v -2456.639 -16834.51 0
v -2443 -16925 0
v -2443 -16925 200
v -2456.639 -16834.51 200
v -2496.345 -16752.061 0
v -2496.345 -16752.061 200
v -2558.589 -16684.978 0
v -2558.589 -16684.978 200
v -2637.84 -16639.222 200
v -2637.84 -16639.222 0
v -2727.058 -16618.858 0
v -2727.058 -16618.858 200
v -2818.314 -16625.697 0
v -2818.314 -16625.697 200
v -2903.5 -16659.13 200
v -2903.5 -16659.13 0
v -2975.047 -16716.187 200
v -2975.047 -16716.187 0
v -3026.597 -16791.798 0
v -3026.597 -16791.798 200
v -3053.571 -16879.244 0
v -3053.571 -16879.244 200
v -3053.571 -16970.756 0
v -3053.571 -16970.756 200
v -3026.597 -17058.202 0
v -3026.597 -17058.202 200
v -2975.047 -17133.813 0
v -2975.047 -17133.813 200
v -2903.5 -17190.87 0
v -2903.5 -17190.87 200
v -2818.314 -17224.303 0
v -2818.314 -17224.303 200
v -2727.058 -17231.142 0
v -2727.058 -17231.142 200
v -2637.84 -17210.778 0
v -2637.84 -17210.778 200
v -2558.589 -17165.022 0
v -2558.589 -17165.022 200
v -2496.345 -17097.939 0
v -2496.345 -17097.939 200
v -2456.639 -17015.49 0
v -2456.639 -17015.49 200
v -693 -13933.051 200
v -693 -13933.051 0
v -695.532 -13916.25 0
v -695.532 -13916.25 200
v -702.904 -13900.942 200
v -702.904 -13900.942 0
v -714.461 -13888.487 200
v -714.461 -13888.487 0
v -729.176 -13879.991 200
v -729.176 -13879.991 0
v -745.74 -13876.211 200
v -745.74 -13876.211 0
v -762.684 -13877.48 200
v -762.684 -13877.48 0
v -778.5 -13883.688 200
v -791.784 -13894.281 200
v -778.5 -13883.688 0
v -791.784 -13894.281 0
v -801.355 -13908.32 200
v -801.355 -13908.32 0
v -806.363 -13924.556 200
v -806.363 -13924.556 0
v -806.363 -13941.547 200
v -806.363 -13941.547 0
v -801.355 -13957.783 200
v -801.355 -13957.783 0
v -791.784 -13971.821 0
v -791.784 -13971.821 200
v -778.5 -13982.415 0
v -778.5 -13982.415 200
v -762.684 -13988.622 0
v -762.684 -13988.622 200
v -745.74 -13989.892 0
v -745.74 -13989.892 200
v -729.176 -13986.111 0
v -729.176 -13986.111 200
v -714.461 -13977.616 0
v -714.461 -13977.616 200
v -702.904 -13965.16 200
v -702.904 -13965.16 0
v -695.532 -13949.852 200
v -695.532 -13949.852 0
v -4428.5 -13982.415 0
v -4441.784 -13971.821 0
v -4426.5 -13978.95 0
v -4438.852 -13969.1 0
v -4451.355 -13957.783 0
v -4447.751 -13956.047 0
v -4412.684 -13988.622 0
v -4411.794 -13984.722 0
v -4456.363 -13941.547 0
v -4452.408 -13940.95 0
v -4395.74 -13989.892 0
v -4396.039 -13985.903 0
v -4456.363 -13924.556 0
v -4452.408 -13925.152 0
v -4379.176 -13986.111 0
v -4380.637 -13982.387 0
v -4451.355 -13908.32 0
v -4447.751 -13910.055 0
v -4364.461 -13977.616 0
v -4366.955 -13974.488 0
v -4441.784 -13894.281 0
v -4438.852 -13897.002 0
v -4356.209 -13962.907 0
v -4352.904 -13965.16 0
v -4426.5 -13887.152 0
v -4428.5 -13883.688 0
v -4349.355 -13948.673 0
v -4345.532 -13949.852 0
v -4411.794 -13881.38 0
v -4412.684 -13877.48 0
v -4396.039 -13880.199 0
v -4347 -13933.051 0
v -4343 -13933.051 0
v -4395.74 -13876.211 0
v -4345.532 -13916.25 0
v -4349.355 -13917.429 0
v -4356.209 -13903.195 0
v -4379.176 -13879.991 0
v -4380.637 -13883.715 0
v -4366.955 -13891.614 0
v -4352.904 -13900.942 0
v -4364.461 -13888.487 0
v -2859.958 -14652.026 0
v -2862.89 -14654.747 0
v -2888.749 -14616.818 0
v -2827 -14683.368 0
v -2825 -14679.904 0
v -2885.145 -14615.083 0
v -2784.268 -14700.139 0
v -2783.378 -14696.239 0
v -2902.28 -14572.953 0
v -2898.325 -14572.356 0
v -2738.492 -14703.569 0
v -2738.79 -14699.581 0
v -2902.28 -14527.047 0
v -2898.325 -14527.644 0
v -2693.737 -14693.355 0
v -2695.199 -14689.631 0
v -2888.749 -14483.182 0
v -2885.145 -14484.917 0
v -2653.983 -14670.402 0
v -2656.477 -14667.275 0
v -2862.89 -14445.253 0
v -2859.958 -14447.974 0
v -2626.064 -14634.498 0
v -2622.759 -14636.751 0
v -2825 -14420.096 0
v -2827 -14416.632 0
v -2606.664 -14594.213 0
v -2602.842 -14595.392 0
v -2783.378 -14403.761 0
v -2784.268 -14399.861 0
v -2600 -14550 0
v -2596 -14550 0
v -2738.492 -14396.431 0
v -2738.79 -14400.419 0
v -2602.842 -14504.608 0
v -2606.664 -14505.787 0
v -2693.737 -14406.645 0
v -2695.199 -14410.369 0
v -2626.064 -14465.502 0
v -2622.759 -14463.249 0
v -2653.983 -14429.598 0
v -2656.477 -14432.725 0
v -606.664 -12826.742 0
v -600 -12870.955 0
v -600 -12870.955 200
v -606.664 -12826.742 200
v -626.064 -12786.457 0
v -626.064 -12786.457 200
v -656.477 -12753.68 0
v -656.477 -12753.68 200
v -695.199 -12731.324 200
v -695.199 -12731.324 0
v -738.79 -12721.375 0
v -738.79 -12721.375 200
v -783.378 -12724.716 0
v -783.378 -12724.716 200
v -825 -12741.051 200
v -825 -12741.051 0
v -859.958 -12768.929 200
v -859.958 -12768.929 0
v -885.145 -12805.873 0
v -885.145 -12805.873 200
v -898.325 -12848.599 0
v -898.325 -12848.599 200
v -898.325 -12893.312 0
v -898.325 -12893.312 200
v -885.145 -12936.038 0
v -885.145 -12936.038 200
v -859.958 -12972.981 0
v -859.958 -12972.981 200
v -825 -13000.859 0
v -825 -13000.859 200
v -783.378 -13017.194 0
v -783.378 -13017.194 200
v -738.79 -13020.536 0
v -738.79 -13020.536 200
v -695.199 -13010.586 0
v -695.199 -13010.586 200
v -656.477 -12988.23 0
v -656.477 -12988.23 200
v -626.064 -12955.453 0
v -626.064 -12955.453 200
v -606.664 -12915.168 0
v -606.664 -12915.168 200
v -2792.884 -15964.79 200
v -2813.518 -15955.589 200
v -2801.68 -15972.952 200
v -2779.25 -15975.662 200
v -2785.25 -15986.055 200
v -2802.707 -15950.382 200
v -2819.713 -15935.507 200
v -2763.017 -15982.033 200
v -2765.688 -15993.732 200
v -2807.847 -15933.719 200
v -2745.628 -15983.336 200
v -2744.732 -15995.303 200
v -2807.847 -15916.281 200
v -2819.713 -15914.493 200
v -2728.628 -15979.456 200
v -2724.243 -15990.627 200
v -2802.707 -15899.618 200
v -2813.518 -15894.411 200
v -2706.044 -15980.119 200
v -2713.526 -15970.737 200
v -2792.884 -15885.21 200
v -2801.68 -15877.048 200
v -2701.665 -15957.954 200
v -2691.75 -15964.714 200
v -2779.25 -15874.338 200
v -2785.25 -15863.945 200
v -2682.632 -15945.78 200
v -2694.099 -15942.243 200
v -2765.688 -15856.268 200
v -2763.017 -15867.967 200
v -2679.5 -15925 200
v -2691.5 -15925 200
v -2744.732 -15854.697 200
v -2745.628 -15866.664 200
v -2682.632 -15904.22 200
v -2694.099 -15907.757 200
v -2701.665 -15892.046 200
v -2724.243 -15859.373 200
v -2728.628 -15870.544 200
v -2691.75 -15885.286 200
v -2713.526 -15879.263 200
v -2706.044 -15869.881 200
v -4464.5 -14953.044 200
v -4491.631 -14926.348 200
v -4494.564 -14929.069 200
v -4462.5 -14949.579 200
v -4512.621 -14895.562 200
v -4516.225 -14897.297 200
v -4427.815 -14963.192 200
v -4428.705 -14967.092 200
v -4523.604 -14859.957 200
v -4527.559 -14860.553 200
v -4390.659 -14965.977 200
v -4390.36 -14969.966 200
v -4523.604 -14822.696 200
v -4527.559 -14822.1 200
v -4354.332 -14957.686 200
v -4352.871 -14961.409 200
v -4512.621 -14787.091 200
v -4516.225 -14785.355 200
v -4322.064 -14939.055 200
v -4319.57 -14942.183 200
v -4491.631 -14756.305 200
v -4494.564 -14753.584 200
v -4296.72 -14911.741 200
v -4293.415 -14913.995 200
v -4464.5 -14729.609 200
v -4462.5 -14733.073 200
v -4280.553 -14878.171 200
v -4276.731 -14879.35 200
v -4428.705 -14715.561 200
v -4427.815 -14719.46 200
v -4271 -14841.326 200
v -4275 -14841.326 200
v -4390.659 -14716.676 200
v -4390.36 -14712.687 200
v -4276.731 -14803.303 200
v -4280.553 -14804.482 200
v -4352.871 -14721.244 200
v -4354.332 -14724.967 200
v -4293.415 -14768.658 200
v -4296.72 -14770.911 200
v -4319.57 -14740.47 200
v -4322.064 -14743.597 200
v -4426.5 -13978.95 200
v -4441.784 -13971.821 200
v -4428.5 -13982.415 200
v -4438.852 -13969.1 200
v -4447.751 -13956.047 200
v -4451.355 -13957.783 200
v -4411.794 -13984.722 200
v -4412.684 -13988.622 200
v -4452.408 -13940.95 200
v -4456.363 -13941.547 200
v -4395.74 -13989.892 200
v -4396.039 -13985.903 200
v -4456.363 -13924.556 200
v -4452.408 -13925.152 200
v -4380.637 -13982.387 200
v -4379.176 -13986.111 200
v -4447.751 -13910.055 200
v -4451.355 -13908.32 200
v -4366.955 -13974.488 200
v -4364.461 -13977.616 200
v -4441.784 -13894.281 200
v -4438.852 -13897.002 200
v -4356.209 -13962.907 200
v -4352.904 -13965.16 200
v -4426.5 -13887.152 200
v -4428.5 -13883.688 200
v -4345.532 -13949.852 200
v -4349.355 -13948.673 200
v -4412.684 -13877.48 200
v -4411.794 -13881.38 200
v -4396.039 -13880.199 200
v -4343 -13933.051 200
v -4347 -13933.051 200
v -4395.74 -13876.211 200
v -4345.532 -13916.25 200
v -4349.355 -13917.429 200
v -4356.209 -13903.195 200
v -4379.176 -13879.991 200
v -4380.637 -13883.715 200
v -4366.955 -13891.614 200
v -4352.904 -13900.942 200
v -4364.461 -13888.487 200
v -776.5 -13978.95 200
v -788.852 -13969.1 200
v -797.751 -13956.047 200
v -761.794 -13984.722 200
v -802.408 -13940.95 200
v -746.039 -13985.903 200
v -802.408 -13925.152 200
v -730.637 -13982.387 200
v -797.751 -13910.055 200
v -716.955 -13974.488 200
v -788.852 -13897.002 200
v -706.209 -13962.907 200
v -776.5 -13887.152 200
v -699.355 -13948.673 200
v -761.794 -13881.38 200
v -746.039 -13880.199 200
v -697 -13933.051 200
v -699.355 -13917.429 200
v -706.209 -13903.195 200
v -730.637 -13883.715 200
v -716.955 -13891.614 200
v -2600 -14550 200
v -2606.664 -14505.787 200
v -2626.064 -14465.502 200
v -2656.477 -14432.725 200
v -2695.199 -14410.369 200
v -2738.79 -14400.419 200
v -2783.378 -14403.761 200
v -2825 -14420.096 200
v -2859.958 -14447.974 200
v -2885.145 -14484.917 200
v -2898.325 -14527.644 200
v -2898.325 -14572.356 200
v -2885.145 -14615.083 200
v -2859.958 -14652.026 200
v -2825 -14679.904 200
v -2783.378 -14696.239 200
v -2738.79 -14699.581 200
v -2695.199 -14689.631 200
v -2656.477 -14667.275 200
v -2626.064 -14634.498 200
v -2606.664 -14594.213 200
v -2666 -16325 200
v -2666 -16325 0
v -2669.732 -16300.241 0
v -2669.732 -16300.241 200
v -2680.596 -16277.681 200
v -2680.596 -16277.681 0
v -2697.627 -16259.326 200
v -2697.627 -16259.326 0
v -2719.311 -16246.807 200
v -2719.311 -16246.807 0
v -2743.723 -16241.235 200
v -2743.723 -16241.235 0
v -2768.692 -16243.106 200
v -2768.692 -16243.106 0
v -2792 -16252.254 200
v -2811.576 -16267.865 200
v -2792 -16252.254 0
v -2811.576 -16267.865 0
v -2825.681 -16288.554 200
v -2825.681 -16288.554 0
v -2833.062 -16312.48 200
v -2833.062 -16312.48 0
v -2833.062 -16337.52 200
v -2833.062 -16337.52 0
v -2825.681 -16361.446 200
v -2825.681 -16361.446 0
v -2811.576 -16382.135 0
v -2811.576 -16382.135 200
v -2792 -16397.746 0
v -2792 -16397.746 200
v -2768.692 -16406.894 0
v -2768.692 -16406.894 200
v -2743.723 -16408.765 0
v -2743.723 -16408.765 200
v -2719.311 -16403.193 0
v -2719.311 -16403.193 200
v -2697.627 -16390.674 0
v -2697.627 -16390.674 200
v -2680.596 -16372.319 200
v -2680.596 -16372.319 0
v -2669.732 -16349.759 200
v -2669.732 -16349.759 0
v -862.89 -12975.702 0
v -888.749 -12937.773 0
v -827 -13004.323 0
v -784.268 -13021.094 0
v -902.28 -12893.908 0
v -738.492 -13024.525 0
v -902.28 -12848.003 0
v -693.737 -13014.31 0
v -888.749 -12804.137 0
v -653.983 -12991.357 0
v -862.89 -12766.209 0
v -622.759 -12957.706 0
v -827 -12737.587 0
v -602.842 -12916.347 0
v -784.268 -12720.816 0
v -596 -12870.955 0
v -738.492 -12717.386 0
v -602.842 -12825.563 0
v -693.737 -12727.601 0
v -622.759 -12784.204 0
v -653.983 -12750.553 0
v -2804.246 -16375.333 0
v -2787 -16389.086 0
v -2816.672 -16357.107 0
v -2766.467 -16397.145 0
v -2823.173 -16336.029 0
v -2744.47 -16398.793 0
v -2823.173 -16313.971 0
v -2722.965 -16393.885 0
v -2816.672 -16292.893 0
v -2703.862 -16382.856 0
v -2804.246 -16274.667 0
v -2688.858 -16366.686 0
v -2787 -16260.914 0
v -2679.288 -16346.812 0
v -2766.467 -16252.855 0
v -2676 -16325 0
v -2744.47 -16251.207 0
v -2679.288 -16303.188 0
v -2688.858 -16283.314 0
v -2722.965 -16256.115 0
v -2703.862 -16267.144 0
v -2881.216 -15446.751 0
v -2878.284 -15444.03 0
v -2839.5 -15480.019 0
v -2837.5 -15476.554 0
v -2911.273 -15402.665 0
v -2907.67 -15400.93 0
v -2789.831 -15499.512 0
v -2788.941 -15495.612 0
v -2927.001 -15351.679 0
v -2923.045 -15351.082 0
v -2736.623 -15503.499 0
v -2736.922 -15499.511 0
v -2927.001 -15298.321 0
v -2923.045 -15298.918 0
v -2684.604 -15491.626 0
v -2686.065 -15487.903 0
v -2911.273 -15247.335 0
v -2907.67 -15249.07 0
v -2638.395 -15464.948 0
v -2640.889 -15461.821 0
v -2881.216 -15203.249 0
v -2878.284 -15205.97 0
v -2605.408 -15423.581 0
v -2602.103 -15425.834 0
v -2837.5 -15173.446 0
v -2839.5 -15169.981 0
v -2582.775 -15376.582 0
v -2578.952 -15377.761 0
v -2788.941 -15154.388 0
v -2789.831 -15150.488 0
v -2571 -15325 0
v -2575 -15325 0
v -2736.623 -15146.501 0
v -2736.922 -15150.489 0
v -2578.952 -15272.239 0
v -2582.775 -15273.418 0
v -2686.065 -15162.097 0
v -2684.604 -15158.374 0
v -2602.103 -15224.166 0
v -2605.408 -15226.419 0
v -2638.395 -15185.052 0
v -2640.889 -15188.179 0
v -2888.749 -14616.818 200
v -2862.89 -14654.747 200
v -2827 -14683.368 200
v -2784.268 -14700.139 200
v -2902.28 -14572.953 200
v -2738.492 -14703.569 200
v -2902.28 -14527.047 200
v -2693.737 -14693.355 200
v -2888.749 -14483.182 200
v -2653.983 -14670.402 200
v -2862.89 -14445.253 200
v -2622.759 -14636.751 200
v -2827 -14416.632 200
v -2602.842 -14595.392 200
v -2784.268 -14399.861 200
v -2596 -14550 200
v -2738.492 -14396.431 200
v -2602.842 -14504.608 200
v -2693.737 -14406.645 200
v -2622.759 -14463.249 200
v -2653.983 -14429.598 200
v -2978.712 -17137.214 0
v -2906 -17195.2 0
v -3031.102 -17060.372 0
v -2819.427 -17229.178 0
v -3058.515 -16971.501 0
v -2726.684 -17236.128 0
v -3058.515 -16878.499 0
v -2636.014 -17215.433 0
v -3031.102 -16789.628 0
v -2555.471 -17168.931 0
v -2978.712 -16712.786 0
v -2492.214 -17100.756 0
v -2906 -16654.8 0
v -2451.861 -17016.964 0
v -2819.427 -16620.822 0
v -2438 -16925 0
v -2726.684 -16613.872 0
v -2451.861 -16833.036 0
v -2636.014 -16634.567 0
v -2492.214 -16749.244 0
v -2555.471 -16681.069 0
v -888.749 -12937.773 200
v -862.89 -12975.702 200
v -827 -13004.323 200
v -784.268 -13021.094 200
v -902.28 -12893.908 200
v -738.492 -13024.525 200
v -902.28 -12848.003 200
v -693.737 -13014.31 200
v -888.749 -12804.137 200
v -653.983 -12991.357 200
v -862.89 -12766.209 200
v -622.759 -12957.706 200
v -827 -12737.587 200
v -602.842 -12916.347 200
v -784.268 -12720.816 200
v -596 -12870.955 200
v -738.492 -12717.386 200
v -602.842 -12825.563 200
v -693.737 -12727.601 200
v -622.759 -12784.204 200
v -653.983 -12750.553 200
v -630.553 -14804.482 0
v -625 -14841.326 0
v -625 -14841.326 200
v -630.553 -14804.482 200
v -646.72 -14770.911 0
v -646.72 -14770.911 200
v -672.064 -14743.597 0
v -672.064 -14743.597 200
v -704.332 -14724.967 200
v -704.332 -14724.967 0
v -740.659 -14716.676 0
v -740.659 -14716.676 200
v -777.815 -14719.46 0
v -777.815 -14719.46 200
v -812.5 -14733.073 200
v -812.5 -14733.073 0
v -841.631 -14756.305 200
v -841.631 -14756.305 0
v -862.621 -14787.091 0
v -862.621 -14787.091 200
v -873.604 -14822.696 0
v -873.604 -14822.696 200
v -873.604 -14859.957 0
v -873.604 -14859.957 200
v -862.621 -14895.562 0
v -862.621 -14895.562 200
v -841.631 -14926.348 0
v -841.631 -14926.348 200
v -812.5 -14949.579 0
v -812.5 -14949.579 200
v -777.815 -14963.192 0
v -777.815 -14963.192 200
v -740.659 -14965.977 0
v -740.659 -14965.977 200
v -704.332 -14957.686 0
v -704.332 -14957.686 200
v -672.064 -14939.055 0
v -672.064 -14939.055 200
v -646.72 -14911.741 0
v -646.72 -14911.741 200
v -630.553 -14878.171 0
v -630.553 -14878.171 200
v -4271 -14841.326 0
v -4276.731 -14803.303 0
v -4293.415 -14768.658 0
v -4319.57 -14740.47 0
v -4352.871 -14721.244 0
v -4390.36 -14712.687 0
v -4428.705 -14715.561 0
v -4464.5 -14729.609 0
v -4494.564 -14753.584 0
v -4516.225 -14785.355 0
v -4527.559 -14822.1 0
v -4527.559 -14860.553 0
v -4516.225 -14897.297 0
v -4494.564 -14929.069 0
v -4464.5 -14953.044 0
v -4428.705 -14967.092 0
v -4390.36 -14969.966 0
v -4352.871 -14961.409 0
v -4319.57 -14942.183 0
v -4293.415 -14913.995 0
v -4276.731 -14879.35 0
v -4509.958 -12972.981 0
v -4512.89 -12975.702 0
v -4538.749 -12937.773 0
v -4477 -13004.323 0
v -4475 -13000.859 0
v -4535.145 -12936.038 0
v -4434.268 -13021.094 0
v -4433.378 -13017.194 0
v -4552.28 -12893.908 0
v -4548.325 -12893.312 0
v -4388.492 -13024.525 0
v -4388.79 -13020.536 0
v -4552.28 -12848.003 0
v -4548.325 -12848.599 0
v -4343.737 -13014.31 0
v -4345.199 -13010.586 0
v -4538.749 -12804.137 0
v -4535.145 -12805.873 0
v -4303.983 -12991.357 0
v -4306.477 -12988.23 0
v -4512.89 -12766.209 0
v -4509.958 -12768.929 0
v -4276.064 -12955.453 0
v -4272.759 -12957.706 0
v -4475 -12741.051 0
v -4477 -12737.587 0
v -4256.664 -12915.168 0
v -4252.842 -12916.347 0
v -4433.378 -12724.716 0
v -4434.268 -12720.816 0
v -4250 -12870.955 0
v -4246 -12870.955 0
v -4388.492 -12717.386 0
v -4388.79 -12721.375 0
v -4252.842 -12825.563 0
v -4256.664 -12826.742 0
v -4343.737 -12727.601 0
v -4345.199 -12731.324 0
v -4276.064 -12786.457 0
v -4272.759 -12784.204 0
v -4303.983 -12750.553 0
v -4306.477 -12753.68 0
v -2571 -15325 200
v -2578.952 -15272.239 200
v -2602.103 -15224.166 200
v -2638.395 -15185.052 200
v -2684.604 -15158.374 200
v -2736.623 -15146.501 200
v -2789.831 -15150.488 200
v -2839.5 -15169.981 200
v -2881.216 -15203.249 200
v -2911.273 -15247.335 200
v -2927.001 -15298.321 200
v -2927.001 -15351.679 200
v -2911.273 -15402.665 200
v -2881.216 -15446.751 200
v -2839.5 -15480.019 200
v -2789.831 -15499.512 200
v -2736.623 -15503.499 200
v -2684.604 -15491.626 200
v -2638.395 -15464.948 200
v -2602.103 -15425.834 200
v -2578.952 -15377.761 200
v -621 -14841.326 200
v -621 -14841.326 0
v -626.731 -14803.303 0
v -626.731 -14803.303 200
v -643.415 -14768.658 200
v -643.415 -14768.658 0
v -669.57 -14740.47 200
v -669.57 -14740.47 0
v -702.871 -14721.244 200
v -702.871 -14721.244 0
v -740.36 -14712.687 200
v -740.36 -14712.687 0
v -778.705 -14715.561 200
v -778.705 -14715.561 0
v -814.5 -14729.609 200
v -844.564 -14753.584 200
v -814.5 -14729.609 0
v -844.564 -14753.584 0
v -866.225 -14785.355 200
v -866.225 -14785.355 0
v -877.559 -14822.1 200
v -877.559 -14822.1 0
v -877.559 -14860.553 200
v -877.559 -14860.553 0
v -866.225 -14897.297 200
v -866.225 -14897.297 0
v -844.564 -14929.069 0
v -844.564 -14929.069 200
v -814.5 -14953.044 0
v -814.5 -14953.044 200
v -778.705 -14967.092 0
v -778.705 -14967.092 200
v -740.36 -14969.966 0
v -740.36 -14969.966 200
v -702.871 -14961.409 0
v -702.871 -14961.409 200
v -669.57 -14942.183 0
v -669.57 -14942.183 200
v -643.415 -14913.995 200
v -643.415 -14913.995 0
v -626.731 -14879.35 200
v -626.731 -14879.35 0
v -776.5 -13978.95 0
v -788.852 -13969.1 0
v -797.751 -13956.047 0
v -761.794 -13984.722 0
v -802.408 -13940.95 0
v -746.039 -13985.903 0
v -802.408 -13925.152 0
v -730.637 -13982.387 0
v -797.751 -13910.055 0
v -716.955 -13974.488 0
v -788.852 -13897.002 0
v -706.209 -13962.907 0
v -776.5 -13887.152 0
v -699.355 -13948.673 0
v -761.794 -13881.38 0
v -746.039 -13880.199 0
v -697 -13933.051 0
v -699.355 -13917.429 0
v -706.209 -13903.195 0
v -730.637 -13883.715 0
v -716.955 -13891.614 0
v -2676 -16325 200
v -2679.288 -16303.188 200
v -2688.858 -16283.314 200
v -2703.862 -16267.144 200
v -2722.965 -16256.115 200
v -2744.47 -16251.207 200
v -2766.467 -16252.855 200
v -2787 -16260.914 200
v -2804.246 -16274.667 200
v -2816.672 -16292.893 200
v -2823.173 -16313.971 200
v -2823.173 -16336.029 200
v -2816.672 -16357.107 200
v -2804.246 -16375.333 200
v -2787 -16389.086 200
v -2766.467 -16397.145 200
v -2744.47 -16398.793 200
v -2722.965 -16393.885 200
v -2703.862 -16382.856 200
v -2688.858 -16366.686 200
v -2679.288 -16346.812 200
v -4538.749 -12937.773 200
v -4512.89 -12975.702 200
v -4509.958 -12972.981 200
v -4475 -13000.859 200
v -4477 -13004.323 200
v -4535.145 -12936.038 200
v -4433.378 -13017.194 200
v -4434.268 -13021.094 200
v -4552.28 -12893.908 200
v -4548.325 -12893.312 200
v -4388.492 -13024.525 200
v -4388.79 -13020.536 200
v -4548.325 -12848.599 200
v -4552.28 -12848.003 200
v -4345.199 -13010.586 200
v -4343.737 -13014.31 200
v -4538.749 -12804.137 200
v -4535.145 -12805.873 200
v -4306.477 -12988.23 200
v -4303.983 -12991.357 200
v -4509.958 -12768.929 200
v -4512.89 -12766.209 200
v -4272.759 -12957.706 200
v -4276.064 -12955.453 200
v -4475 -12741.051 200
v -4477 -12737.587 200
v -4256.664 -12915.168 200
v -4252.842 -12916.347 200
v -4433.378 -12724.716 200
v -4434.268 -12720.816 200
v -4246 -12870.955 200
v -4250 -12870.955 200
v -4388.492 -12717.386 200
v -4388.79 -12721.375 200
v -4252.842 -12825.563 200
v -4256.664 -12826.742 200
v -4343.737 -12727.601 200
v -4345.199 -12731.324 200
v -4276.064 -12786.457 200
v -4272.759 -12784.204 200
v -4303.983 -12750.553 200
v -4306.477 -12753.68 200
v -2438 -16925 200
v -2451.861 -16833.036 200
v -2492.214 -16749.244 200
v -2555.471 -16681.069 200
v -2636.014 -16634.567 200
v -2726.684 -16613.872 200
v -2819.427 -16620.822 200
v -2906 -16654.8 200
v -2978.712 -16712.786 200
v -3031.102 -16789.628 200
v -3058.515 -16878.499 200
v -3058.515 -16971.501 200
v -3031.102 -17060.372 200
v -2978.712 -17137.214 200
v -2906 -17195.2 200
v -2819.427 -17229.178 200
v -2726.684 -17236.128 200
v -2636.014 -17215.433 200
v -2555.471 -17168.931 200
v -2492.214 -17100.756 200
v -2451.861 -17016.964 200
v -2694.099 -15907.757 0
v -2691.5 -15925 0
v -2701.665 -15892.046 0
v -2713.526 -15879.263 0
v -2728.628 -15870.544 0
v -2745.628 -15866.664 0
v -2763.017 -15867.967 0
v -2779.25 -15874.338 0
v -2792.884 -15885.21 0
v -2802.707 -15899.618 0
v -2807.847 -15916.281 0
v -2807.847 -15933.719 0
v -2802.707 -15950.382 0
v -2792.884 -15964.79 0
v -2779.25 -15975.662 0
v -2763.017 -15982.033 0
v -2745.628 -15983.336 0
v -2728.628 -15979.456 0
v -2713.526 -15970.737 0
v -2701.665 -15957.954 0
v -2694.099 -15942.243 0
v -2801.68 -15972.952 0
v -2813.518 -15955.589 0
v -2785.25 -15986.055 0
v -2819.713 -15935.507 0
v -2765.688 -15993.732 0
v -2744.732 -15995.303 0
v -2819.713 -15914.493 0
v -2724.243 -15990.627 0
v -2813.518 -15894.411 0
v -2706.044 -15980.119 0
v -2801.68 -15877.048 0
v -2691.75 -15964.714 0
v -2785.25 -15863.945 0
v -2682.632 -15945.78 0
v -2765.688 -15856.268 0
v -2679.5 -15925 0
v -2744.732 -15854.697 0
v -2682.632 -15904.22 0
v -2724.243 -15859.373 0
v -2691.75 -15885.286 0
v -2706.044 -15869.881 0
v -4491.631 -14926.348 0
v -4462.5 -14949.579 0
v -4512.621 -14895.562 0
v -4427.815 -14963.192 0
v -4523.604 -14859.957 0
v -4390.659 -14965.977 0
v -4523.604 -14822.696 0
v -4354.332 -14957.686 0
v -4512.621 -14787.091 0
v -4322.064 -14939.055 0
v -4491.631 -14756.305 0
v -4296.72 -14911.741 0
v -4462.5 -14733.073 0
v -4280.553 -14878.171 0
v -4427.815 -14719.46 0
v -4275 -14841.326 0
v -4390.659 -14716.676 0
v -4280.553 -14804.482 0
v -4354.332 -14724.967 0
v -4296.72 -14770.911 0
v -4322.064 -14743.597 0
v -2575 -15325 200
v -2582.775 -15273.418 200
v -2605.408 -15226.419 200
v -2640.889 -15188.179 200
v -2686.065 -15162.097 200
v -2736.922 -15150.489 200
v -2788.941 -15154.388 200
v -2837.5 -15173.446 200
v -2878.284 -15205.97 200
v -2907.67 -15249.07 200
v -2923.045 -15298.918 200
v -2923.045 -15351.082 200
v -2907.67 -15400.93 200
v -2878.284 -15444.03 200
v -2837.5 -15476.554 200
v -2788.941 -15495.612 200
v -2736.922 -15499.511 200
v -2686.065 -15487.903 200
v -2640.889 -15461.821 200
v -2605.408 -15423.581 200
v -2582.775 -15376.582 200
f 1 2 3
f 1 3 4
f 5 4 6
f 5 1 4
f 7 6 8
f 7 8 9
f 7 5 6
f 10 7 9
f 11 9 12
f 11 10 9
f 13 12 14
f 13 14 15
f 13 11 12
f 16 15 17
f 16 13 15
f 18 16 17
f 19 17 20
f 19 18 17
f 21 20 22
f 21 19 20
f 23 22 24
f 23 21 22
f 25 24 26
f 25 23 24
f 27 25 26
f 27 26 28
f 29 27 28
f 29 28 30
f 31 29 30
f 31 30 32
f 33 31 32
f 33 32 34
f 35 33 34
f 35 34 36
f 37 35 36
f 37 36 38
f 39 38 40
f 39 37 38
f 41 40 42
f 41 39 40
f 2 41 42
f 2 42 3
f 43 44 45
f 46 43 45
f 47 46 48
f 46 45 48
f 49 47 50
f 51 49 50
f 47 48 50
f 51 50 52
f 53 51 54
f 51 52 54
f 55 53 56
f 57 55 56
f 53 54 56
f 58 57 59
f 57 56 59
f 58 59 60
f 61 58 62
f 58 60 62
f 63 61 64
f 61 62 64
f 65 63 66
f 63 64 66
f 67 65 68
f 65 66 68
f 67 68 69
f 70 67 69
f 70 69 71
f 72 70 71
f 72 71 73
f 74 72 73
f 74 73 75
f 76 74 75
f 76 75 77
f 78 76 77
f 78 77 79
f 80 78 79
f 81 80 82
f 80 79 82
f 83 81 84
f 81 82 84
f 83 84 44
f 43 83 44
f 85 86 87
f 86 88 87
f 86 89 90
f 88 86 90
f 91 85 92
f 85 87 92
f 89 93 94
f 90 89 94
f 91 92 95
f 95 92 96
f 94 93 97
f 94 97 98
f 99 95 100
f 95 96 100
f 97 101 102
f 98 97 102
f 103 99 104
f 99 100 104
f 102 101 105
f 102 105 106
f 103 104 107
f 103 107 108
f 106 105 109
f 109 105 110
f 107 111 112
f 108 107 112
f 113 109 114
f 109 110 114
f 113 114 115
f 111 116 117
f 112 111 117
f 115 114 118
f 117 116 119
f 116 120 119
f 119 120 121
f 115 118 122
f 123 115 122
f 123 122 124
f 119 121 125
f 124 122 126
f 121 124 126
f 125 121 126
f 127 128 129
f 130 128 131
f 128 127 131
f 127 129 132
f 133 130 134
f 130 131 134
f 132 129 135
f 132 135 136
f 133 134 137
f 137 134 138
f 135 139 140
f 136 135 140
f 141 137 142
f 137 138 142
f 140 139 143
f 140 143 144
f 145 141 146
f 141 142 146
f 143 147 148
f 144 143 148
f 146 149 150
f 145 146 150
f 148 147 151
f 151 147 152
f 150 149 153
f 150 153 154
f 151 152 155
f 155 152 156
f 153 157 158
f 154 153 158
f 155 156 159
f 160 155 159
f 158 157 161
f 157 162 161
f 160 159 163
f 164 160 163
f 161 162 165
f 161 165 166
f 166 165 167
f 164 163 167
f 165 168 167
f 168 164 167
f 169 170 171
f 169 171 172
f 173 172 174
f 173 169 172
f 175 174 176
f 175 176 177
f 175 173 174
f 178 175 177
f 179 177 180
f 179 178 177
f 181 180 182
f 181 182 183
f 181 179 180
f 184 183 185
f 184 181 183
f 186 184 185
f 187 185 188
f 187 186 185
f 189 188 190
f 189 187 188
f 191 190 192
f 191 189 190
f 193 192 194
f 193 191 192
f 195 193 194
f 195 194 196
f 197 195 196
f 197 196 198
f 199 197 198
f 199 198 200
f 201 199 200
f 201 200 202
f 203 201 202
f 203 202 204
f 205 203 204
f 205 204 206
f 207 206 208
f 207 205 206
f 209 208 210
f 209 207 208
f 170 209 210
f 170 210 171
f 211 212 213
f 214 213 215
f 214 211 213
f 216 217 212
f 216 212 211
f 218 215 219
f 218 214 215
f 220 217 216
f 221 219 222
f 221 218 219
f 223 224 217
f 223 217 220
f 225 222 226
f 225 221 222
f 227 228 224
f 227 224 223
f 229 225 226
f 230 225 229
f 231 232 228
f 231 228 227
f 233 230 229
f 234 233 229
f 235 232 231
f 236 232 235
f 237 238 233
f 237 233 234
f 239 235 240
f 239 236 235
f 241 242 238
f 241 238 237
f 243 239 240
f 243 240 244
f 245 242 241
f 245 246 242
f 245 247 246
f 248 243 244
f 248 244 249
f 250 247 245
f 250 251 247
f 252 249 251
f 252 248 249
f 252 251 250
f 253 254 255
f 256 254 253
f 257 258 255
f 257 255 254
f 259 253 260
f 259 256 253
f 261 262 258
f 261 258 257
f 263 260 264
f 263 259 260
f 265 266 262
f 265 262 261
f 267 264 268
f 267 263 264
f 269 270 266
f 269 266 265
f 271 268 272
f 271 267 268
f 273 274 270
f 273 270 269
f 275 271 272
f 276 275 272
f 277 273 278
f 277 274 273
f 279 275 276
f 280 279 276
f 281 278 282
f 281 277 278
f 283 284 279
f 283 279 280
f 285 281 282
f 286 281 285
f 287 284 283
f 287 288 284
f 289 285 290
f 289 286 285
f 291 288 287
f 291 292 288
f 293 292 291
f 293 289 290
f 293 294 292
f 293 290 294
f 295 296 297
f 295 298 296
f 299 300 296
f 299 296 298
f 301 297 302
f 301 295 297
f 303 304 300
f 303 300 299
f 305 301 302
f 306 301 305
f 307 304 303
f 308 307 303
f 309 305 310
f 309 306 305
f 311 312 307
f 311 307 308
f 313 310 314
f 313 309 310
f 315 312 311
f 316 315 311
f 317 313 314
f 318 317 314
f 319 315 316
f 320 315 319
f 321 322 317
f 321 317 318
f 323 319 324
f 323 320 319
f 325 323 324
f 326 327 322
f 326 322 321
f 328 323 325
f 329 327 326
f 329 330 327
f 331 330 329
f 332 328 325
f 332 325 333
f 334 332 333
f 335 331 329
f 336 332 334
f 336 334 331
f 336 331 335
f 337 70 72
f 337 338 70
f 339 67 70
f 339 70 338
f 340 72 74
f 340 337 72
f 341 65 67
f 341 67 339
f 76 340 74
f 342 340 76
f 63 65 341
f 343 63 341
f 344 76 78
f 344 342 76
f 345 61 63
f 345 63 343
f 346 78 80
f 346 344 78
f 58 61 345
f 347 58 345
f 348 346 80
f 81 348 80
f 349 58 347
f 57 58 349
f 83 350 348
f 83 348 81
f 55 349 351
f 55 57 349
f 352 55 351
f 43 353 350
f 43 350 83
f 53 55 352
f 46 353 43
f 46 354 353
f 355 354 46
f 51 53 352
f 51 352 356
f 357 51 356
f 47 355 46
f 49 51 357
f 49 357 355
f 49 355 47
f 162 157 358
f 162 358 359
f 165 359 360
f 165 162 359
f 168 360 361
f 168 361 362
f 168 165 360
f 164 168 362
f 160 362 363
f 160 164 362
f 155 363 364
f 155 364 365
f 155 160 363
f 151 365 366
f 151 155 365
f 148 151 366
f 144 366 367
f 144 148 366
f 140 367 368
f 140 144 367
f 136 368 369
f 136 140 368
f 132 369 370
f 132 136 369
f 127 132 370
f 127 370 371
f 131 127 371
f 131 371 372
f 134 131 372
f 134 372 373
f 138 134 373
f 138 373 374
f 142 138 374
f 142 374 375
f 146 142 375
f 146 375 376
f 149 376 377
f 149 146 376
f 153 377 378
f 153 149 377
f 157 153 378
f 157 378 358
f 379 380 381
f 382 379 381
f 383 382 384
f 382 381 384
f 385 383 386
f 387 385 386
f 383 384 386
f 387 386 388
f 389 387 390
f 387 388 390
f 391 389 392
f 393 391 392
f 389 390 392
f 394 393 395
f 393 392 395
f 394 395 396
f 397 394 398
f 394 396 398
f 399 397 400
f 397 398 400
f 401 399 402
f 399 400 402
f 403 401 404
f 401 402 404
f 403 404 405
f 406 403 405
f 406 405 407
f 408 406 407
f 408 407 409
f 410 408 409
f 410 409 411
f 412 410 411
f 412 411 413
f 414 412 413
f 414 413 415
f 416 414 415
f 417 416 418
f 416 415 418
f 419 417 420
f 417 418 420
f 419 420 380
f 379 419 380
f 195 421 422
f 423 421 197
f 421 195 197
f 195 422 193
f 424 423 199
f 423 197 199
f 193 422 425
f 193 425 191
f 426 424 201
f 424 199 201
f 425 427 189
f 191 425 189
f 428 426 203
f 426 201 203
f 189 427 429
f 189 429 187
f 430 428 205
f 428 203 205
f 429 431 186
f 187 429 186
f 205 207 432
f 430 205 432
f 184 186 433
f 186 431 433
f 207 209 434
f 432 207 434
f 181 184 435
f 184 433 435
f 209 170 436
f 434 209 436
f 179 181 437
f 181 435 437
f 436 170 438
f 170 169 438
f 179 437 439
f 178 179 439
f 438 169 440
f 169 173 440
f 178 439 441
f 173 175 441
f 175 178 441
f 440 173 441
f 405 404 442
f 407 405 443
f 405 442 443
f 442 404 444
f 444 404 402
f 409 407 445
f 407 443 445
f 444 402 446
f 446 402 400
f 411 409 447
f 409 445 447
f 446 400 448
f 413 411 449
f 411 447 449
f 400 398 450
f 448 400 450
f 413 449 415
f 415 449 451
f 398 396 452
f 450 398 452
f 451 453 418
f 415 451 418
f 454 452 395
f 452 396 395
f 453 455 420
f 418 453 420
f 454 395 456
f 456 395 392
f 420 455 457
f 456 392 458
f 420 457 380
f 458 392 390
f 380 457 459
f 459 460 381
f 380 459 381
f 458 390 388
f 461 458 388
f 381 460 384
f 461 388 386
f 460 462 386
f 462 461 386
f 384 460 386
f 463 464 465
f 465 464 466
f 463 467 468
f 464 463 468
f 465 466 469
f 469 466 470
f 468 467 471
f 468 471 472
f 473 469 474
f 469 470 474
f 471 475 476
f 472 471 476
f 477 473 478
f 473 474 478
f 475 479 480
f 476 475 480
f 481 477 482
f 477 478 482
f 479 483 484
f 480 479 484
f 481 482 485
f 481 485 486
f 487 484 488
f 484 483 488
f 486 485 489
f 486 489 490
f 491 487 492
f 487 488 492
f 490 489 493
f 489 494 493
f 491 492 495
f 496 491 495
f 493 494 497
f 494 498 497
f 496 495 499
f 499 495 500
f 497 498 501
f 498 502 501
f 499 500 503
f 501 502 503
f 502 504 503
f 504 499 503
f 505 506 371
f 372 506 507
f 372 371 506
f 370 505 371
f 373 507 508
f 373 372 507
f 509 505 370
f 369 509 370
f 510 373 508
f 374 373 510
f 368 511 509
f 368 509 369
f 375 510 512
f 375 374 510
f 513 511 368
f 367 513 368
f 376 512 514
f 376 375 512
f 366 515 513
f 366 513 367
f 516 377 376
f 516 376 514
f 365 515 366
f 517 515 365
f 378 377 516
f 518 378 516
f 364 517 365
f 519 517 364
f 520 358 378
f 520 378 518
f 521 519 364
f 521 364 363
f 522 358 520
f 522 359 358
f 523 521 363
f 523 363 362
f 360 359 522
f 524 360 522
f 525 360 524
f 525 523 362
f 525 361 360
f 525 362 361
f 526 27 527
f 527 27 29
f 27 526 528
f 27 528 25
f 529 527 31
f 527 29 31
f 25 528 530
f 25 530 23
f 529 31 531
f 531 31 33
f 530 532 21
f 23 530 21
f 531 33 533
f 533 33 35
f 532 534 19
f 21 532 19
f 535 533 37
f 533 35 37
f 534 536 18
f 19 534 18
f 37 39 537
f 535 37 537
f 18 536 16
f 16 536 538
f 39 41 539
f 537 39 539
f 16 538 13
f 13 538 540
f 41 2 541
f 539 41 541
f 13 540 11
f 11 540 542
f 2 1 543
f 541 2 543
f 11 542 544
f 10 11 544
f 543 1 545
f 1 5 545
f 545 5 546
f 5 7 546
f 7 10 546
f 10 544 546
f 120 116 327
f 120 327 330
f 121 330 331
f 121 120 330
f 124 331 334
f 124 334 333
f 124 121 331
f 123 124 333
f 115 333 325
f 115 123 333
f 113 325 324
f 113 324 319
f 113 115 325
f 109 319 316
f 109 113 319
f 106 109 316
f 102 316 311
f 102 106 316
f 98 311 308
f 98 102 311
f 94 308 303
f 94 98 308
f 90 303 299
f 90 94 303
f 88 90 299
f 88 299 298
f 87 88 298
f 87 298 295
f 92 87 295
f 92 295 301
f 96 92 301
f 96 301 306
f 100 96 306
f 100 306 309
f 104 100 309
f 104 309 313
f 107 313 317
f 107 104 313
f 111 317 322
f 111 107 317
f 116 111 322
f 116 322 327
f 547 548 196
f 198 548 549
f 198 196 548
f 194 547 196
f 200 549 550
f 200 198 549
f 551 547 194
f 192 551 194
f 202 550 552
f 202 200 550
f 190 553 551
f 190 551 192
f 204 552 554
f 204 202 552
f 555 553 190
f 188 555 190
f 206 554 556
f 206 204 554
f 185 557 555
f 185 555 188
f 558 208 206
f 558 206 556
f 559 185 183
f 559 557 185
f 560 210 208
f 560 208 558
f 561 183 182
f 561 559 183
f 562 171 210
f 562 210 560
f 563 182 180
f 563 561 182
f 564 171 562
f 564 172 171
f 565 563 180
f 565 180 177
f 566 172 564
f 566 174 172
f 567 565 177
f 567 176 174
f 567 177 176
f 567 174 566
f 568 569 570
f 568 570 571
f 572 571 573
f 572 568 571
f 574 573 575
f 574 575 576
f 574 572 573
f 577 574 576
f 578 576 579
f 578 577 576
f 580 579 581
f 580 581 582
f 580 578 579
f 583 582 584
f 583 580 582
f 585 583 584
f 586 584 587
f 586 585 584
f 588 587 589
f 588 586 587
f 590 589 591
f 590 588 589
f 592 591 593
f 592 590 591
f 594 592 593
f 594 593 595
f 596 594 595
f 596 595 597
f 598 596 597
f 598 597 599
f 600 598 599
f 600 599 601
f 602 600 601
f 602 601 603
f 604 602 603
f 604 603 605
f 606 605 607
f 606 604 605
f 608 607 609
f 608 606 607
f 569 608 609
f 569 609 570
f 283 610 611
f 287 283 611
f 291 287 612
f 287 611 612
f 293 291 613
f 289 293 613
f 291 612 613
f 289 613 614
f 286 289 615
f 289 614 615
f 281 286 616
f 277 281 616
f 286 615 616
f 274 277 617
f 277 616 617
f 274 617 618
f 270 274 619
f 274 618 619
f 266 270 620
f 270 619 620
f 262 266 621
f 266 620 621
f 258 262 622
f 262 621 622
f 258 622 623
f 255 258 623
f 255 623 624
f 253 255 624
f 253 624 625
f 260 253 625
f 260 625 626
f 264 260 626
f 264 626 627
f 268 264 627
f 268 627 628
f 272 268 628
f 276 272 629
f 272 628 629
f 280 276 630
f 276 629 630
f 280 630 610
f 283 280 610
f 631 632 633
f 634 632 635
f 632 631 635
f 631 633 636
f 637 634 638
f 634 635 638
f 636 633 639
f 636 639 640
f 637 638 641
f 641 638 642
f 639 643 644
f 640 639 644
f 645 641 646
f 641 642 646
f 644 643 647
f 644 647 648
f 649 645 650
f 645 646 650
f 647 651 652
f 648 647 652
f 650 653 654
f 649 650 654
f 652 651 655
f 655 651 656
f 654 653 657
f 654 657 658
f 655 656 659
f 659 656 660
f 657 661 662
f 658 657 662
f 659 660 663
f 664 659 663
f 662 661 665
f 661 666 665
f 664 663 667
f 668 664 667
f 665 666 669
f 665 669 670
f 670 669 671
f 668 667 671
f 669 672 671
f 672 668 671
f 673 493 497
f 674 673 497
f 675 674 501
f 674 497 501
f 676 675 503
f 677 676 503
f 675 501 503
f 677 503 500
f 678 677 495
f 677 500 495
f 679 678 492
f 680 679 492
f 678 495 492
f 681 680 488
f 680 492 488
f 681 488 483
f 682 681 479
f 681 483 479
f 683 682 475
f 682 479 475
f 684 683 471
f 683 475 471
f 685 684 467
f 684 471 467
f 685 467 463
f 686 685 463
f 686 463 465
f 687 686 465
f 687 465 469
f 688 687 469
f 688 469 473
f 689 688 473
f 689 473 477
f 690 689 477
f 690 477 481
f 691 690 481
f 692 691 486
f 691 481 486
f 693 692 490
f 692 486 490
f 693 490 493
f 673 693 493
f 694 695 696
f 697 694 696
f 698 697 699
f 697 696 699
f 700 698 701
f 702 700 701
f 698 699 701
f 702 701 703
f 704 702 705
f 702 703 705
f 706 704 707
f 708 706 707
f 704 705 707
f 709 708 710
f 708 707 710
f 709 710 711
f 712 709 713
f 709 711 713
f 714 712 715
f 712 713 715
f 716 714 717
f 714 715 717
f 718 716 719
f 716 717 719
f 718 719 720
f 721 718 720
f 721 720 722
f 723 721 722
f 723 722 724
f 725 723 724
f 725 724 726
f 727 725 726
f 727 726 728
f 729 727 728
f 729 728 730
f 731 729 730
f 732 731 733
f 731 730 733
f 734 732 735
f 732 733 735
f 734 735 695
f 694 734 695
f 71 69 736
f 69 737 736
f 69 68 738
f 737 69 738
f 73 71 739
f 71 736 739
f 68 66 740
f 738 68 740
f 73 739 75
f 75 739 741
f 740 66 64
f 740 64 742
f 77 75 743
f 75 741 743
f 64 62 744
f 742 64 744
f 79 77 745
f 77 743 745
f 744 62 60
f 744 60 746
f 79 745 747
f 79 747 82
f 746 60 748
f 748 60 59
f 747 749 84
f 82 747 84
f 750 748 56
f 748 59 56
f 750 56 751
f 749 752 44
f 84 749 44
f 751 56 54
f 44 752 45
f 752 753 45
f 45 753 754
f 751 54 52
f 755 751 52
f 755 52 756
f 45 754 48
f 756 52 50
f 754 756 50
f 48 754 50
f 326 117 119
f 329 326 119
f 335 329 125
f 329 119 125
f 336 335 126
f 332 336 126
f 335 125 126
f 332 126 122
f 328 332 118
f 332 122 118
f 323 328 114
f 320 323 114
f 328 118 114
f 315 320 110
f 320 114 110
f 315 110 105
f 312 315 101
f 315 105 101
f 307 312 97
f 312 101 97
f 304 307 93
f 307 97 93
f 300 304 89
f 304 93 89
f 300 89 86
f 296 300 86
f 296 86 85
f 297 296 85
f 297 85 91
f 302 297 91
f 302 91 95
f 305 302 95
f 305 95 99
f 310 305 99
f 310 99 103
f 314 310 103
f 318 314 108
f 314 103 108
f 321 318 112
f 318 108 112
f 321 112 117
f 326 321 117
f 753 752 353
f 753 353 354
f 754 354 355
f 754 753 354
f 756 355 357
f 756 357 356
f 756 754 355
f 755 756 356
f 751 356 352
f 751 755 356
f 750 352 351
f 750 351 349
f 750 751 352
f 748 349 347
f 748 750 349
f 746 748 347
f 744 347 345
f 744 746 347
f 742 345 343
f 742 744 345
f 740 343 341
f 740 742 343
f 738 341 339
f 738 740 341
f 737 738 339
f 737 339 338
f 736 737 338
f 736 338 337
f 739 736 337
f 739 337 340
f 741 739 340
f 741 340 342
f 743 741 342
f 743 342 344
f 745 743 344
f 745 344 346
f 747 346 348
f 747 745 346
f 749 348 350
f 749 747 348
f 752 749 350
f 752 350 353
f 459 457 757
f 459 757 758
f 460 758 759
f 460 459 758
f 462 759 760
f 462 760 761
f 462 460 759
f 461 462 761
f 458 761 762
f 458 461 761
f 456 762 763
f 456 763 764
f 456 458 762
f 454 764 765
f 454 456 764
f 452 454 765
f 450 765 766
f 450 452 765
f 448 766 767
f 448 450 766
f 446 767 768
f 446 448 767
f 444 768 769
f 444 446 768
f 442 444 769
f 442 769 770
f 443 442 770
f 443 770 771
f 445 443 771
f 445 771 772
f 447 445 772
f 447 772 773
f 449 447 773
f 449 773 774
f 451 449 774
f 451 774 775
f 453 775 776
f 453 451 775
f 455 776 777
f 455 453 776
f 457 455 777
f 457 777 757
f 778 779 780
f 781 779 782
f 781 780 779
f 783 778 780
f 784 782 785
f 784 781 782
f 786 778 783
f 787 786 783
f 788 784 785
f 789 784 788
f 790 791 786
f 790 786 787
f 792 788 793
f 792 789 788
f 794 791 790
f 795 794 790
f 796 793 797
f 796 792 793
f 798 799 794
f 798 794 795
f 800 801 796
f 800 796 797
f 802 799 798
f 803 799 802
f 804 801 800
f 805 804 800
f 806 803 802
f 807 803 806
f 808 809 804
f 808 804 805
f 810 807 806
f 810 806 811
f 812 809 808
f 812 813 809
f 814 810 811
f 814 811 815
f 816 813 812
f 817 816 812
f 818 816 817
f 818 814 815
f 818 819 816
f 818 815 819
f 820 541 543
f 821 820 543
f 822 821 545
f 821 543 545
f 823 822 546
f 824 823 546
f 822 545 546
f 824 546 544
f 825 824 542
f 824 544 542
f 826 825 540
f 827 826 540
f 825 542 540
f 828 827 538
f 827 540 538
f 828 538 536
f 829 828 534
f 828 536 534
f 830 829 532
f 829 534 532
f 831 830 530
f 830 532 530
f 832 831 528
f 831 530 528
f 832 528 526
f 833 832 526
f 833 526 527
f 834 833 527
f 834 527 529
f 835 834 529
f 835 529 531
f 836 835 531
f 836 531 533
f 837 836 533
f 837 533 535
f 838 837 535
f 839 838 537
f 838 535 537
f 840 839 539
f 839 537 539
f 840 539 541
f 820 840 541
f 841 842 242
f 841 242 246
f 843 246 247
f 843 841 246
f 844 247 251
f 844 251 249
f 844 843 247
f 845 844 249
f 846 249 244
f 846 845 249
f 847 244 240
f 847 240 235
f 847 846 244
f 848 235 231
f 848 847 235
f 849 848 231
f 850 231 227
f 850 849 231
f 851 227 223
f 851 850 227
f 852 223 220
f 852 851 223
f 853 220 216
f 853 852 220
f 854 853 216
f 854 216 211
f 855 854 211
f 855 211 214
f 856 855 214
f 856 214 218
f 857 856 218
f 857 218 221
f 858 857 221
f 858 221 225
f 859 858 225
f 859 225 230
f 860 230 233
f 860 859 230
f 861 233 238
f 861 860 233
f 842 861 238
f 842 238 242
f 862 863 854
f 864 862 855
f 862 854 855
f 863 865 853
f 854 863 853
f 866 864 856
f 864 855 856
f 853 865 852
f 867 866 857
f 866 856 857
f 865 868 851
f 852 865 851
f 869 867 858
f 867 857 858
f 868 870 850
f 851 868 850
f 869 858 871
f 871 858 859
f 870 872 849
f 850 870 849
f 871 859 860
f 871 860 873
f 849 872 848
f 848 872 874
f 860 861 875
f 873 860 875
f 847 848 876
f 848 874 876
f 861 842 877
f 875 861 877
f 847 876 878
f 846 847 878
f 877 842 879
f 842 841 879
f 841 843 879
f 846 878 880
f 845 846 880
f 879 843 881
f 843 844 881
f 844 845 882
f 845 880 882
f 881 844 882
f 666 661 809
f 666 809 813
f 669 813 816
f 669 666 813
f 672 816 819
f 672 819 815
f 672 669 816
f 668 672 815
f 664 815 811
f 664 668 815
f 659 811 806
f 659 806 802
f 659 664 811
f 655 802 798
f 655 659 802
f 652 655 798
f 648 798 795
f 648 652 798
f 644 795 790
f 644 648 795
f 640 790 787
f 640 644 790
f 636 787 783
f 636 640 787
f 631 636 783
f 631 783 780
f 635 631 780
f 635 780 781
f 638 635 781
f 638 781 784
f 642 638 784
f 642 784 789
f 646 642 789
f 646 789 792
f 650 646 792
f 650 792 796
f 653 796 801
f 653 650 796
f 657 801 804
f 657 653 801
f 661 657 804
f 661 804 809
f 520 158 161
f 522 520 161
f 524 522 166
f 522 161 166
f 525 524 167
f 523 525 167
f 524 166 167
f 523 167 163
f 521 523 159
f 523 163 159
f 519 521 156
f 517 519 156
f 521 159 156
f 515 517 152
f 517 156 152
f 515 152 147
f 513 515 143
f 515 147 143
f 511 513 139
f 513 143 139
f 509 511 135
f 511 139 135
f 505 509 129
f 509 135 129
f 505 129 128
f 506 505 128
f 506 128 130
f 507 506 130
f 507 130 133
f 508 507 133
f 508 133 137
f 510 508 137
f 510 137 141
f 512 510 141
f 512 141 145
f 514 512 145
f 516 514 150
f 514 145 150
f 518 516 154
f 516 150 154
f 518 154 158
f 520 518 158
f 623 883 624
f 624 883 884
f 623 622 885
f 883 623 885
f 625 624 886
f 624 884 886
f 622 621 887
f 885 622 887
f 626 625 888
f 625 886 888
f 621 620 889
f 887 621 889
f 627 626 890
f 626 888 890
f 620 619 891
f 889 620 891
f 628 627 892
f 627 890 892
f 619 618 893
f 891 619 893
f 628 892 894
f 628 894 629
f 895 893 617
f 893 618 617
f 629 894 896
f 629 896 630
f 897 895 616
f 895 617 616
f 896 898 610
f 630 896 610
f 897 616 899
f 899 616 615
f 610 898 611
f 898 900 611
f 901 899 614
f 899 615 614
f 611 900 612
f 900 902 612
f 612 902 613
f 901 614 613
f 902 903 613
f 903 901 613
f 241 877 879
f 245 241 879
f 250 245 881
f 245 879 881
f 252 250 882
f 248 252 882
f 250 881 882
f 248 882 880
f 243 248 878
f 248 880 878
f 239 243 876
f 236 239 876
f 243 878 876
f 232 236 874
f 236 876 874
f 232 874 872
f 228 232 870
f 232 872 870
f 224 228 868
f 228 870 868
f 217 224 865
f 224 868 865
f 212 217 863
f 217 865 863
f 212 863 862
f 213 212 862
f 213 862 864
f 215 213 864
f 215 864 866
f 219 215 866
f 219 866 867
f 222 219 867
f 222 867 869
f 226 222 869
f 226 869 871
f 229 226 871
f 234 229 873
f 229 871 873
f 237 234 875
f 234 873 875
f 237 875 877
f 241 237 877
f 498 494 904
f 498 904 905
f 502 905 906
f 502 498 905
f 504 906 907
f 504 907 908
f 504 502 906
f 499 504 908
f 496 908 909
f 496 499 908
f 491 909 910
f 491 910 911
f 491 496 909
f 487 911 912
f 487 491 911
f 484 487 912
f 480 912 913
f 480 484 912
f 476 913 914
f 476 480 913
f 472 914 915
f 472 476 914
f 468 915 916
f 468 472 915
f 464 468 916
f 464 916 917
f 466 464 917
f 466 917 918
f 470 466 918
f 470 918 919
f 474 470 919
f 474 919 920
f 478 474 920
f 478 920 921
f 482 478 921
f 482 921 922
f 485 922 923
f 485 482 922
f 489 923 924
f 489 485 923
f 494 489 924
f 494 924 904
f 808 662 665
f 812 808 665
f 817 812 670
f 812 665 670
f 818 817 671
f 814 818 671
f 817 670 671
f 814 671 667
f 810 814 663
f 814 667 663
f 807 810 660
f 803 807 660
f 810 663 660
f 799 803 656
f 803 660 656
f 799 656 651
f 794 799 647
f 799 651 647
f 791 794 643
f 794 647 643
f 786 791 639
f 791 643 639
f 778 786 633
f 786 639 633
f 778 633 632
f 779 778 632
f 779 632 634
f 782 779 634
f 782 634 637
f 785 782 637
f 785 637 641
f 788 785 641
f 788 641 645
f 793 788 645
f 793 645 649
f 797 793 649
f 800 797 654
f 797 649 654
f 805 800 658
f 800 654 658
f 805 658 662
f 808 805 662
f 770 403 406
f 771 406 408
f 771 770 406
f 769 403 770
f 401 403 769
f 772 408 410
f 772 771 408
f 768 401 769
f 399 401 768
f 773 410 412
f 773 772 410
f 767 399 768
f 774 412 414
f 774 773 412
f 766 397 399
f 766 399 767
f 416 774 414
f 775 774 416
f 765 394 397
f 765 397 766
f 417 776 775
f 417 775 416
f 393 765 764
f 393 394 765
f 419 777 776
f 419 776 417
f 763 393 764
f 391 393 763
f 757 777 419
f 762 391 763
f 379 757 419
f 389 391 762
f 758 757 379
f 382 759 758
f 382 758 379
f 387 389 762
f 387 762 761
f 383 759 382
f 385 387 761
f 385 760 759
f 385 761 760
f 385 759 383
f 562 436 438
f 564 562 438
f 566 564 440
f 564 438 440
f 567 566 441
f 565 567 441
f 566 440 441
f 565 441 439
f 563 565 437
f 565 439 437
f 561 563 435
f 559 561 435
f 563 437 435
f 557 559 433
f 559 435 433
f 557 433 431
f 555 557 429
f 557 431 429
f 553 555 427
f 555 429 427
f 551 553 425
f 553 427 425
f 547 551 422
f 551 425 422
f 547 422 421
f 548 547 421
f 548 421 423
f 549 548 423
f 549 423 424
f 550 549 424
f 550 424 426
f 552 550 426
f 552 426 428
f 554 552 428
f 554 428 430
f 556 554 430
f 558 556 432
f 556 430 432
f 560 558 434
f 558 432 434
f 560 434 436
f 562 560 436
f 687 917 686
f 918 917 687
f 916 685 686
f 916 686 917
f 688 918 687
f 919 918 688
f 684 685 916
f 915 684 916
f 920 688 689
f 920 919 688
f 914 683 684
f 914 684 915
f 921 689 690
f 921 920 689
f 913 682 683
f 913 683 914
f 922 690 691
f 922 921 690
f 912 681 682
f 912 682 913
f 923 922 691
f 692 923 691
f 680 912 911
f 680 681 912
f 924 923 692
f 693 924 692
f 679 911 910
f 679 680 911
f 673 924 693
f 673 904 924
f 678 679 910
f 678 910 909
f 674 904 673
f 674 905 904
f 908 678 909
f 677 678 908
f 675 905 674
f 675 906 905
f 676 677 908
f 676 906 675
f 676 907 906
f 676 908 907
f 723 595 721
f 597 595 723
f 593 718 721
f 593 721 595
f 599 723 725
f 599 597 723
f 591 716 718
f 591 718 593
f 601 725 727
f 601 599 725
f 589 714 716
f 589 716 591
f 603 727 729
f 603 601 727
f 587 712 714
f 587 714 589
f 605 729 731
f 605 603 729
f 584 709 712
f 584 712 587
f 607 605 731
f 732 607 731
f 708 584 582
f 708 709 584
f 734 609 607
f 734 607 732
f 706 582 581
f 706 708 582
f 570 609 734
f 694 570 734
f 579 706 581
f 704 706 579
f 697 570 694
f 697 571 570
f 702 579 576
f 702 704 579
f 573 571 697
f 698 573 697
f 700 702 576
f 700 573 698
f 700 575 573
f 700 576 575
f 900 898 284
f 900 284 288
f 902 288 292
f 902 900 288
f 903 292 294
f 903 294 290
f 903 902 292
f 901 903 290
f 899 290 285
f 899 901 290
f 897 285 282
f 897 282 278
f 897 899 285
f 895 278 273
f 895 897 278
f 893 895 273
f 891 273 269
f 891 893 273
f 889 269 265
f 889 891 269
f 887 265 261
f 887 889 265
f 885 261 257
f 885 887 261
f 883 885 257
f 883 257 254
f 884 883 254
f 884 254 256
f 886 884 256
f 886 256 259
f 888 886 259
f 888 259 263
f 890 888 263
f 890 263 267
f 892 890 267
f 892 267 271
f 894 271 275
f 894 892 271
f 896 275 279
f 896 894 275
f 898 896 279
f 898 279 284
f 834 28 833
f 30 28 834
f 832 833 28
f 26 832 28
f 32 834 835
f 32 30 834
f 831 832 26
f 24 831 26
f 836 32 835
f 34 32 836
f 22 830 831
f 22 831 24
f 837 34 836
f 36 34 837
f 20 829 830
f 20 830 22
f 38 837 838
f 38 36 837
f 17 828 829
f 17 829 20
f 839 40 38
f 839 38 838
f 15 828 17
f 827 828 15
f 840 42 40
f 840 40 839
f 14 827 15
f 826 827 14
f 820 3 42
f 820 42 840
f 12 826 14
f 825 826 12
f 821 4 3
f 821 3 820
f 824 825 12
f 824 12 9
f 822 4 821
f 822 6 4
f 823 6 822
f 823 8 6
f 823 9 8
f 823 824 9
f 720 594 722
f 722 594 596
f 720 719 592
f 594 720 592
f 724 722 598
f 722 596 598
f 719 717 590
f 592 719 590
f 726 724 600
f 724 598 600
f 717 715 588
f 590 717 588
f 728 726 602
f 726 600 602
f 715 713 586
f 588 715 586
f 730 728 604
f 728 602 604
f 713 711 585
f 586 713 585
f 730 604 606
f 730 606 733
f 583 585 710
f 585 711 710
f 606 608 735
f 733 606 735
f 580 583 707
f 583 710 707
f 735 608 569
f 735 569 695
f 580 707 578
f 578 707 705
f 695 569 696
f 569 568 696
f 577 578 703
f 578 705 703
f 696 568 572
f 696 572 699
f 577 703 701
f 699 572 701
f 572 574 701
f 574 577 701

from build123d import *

# Parameters (mm, degrees)
SKETCH1_R         = 312
SKETCH1_R_2       = 307
EXTRUDE1_DEPTH    = 200
SKETCH1_R_3       = 84
SKETCH1_R_4       = 74
EXTRUDE1_2_DEPTH  = 200
SKETCH1_R_5       = 70.5
SKETCH1_R_6       = 58.5
EXTRUDE1_3_DEPTH  = 200
SKETCH1_R_7       = 179
SKETCH1_R_8       = 175
EXTRUDE1_4_DEPTH  = 200
SKETCH1_R_9       = 154
SKETCH1_R_10      = 150
EXTRUDE1_5_DEPTH  = 200
EXTRUDE1_6_DEPTH  = 200
SKETCH1_R_11      = 57
SKETCH1_R_12      = 53
EXTRUDE1_7_DEPTH  = 200
SKETCH1_R_13      = 129
SKETCH1_R_14      = 125
EXTRUDE1_8_DEPTH  = 200
EXTRUDE1_9_DEPTH  = 200
EXTRUDE1_10_DEPTH = 200
EXTRUDE1_11_DEPTH = 200


with BuildPart() as part:
    # Sketch1 → Extrude1 (new body)
    with BuildSketch(Plane.XY):
        with Locations((-2750, -16925)):
            Circle(SKETCH1_R)
        with Locations((-2750, -16925)):
            Circle(SKETCH1_R_2, mode=Mode.SUBTRACT)
    extrude(amount=EXTRUDE1_DEPTH)


with BuildPart() as body_2:
    # Sketch1 → Extrude1 2 (new body)
    with BuildSketch(Plane.XY):
        with Locations((-2750, -16325)):
            Circle(SKETCH1_R_3)
        with Locations((-2750, -16325)):
            Circle(SKETCH1_R_4, mode=Mode.SUBTRACT)
    extrude(amount=EXTRUDE1_2_DEPTH)


with BuildPart() as body_3:
    # Sketch1 → Extrude1 3 (new body)
    with BuildSketch(Plane.XY):
        with Locations((-2750, -15925)):
            Circle(SKETCH1_R_5)
        with Locations((-2750, -15925)):
            Circle(SKETCH1_R_6, mode=Mode.SUBTRACT)
    extrude(amount=EXTRUDE1_3_DEPTH)


with BuildPart() as body_4:
    # Sketch1 → Extrude1 4 (new body)
    with BuildSketch(Plane.XY):
        with Locations((-2750, -15325)):
            Circle(SKETCH1_R_7)
        with Locations((-2750, -15325)):
            Circle(SKETCH1_R_8, mode=Mode.SUBTRACT)
    extrude(amount=EXTRUDE1_4_DEPTH)


with BuildPart() as body_5:
    # Sketch1 → Extrude1 5 (new body)
    with BuildSketch(Plane.XY):
        with Locations((-2750, -14550)):
            Circle(SKETCH1_R_9)
        with Locations((-2750, -14550)):
            Circle(SKETCH1_R_10, mode=Mode.SUBTRACT)
    extrude(amount=EXTRUDE1_5_DEPTH)


with BuildPart() as body_6:
    # Sketch1 → Extrude1 6 (new body)
    with BuildSketch(Plane.XY):
        with Locations((-750, -12870.955169581)):
            Circle(SKETCH1_R_9)
        with Locations((-750, -12870.955169581)):
            Circle(SKETCH1_R_10, mode=Mode.SUBTRACT)
    extrude(amount=EXTRUDE1_6_DEPTH)


with BuildPart() as body_7:
    # Sketch1 → Extrude1 7 (new body)
    with BuildSketch(Plane.XY):
        with Locations((-750, -13933.051127446)):
            Circle(SKETCH1_R_11)
        with Locations((-750, -13933.051127446)):
            Circle(SKETCH1_R_12, mode=Mode.SUBTRACT)
    extrude(amount=EXTRUDE1_7_DEPTH)


with BuildPart() as body_8:
    # Sketch1 → Extrude1 8 (new body)
    with BuildSketch(Plane.XY):
        with Locations((-750, -14841.326291413)):
            Circle(SKETCH1_R_13)
        with Locations((-750, -14841.326291413)):
            Circle(SKETCH1_R_14, mode=Mode.SUBTRACT)
    extrude(amount=EXTRUDE1_8_DEPTH)


with BuildPart() as body_9:
    # Sketch1 → Extrude1 9 (new body)
    with BuildSketch(Plane.XY):
        with Locations((-4400, -14841.326291413)):
            Circle(SKETCH1_R_13)
        with Locations((-4400, -14841.326291413)):
            Circle(SKETCH1_R_14, mode=Mode.SUBTRACT)
    extrude(amount=EXTRUDE1_9_DEPTH)


with BuildPart() as body_10:
    # Sketch1 → Extrude1 10 (new body)
    with BuildSketch(Plane.XY):
        with Locations((-4400, -13933.051127446)):
            Circle(SKETCH1_R_11)
        with Locations((-4400, -13933.051127446)):
            Circle(SKETCH1_R_12, mode=Mode.SUBTRACT)
    extrude(amount=EXTRUDE1_10_DEPTH)


with BuildPart() as body_11:
    # Sketch1 → Extrude1 11 (new body)
    with BuildSketch(Plane.XY):
        with Locations((-4400, -12870.955169581)):
            Circle(SKETCH1_R_9)
        with Locations((-4400, -12870.955169581)):
            Circle(SKETCH1_R_10, mode=Mode.SUBTRACT)
    extrude(amount=EXTRUDE1_11_DEPTH)


solid = Compound([part.part, body_2.part, body_3.part, body_4.part, body_5.part, body_6.part, body_7.part, body_8.part, body_9.part, body_10.part, body_11.part])
